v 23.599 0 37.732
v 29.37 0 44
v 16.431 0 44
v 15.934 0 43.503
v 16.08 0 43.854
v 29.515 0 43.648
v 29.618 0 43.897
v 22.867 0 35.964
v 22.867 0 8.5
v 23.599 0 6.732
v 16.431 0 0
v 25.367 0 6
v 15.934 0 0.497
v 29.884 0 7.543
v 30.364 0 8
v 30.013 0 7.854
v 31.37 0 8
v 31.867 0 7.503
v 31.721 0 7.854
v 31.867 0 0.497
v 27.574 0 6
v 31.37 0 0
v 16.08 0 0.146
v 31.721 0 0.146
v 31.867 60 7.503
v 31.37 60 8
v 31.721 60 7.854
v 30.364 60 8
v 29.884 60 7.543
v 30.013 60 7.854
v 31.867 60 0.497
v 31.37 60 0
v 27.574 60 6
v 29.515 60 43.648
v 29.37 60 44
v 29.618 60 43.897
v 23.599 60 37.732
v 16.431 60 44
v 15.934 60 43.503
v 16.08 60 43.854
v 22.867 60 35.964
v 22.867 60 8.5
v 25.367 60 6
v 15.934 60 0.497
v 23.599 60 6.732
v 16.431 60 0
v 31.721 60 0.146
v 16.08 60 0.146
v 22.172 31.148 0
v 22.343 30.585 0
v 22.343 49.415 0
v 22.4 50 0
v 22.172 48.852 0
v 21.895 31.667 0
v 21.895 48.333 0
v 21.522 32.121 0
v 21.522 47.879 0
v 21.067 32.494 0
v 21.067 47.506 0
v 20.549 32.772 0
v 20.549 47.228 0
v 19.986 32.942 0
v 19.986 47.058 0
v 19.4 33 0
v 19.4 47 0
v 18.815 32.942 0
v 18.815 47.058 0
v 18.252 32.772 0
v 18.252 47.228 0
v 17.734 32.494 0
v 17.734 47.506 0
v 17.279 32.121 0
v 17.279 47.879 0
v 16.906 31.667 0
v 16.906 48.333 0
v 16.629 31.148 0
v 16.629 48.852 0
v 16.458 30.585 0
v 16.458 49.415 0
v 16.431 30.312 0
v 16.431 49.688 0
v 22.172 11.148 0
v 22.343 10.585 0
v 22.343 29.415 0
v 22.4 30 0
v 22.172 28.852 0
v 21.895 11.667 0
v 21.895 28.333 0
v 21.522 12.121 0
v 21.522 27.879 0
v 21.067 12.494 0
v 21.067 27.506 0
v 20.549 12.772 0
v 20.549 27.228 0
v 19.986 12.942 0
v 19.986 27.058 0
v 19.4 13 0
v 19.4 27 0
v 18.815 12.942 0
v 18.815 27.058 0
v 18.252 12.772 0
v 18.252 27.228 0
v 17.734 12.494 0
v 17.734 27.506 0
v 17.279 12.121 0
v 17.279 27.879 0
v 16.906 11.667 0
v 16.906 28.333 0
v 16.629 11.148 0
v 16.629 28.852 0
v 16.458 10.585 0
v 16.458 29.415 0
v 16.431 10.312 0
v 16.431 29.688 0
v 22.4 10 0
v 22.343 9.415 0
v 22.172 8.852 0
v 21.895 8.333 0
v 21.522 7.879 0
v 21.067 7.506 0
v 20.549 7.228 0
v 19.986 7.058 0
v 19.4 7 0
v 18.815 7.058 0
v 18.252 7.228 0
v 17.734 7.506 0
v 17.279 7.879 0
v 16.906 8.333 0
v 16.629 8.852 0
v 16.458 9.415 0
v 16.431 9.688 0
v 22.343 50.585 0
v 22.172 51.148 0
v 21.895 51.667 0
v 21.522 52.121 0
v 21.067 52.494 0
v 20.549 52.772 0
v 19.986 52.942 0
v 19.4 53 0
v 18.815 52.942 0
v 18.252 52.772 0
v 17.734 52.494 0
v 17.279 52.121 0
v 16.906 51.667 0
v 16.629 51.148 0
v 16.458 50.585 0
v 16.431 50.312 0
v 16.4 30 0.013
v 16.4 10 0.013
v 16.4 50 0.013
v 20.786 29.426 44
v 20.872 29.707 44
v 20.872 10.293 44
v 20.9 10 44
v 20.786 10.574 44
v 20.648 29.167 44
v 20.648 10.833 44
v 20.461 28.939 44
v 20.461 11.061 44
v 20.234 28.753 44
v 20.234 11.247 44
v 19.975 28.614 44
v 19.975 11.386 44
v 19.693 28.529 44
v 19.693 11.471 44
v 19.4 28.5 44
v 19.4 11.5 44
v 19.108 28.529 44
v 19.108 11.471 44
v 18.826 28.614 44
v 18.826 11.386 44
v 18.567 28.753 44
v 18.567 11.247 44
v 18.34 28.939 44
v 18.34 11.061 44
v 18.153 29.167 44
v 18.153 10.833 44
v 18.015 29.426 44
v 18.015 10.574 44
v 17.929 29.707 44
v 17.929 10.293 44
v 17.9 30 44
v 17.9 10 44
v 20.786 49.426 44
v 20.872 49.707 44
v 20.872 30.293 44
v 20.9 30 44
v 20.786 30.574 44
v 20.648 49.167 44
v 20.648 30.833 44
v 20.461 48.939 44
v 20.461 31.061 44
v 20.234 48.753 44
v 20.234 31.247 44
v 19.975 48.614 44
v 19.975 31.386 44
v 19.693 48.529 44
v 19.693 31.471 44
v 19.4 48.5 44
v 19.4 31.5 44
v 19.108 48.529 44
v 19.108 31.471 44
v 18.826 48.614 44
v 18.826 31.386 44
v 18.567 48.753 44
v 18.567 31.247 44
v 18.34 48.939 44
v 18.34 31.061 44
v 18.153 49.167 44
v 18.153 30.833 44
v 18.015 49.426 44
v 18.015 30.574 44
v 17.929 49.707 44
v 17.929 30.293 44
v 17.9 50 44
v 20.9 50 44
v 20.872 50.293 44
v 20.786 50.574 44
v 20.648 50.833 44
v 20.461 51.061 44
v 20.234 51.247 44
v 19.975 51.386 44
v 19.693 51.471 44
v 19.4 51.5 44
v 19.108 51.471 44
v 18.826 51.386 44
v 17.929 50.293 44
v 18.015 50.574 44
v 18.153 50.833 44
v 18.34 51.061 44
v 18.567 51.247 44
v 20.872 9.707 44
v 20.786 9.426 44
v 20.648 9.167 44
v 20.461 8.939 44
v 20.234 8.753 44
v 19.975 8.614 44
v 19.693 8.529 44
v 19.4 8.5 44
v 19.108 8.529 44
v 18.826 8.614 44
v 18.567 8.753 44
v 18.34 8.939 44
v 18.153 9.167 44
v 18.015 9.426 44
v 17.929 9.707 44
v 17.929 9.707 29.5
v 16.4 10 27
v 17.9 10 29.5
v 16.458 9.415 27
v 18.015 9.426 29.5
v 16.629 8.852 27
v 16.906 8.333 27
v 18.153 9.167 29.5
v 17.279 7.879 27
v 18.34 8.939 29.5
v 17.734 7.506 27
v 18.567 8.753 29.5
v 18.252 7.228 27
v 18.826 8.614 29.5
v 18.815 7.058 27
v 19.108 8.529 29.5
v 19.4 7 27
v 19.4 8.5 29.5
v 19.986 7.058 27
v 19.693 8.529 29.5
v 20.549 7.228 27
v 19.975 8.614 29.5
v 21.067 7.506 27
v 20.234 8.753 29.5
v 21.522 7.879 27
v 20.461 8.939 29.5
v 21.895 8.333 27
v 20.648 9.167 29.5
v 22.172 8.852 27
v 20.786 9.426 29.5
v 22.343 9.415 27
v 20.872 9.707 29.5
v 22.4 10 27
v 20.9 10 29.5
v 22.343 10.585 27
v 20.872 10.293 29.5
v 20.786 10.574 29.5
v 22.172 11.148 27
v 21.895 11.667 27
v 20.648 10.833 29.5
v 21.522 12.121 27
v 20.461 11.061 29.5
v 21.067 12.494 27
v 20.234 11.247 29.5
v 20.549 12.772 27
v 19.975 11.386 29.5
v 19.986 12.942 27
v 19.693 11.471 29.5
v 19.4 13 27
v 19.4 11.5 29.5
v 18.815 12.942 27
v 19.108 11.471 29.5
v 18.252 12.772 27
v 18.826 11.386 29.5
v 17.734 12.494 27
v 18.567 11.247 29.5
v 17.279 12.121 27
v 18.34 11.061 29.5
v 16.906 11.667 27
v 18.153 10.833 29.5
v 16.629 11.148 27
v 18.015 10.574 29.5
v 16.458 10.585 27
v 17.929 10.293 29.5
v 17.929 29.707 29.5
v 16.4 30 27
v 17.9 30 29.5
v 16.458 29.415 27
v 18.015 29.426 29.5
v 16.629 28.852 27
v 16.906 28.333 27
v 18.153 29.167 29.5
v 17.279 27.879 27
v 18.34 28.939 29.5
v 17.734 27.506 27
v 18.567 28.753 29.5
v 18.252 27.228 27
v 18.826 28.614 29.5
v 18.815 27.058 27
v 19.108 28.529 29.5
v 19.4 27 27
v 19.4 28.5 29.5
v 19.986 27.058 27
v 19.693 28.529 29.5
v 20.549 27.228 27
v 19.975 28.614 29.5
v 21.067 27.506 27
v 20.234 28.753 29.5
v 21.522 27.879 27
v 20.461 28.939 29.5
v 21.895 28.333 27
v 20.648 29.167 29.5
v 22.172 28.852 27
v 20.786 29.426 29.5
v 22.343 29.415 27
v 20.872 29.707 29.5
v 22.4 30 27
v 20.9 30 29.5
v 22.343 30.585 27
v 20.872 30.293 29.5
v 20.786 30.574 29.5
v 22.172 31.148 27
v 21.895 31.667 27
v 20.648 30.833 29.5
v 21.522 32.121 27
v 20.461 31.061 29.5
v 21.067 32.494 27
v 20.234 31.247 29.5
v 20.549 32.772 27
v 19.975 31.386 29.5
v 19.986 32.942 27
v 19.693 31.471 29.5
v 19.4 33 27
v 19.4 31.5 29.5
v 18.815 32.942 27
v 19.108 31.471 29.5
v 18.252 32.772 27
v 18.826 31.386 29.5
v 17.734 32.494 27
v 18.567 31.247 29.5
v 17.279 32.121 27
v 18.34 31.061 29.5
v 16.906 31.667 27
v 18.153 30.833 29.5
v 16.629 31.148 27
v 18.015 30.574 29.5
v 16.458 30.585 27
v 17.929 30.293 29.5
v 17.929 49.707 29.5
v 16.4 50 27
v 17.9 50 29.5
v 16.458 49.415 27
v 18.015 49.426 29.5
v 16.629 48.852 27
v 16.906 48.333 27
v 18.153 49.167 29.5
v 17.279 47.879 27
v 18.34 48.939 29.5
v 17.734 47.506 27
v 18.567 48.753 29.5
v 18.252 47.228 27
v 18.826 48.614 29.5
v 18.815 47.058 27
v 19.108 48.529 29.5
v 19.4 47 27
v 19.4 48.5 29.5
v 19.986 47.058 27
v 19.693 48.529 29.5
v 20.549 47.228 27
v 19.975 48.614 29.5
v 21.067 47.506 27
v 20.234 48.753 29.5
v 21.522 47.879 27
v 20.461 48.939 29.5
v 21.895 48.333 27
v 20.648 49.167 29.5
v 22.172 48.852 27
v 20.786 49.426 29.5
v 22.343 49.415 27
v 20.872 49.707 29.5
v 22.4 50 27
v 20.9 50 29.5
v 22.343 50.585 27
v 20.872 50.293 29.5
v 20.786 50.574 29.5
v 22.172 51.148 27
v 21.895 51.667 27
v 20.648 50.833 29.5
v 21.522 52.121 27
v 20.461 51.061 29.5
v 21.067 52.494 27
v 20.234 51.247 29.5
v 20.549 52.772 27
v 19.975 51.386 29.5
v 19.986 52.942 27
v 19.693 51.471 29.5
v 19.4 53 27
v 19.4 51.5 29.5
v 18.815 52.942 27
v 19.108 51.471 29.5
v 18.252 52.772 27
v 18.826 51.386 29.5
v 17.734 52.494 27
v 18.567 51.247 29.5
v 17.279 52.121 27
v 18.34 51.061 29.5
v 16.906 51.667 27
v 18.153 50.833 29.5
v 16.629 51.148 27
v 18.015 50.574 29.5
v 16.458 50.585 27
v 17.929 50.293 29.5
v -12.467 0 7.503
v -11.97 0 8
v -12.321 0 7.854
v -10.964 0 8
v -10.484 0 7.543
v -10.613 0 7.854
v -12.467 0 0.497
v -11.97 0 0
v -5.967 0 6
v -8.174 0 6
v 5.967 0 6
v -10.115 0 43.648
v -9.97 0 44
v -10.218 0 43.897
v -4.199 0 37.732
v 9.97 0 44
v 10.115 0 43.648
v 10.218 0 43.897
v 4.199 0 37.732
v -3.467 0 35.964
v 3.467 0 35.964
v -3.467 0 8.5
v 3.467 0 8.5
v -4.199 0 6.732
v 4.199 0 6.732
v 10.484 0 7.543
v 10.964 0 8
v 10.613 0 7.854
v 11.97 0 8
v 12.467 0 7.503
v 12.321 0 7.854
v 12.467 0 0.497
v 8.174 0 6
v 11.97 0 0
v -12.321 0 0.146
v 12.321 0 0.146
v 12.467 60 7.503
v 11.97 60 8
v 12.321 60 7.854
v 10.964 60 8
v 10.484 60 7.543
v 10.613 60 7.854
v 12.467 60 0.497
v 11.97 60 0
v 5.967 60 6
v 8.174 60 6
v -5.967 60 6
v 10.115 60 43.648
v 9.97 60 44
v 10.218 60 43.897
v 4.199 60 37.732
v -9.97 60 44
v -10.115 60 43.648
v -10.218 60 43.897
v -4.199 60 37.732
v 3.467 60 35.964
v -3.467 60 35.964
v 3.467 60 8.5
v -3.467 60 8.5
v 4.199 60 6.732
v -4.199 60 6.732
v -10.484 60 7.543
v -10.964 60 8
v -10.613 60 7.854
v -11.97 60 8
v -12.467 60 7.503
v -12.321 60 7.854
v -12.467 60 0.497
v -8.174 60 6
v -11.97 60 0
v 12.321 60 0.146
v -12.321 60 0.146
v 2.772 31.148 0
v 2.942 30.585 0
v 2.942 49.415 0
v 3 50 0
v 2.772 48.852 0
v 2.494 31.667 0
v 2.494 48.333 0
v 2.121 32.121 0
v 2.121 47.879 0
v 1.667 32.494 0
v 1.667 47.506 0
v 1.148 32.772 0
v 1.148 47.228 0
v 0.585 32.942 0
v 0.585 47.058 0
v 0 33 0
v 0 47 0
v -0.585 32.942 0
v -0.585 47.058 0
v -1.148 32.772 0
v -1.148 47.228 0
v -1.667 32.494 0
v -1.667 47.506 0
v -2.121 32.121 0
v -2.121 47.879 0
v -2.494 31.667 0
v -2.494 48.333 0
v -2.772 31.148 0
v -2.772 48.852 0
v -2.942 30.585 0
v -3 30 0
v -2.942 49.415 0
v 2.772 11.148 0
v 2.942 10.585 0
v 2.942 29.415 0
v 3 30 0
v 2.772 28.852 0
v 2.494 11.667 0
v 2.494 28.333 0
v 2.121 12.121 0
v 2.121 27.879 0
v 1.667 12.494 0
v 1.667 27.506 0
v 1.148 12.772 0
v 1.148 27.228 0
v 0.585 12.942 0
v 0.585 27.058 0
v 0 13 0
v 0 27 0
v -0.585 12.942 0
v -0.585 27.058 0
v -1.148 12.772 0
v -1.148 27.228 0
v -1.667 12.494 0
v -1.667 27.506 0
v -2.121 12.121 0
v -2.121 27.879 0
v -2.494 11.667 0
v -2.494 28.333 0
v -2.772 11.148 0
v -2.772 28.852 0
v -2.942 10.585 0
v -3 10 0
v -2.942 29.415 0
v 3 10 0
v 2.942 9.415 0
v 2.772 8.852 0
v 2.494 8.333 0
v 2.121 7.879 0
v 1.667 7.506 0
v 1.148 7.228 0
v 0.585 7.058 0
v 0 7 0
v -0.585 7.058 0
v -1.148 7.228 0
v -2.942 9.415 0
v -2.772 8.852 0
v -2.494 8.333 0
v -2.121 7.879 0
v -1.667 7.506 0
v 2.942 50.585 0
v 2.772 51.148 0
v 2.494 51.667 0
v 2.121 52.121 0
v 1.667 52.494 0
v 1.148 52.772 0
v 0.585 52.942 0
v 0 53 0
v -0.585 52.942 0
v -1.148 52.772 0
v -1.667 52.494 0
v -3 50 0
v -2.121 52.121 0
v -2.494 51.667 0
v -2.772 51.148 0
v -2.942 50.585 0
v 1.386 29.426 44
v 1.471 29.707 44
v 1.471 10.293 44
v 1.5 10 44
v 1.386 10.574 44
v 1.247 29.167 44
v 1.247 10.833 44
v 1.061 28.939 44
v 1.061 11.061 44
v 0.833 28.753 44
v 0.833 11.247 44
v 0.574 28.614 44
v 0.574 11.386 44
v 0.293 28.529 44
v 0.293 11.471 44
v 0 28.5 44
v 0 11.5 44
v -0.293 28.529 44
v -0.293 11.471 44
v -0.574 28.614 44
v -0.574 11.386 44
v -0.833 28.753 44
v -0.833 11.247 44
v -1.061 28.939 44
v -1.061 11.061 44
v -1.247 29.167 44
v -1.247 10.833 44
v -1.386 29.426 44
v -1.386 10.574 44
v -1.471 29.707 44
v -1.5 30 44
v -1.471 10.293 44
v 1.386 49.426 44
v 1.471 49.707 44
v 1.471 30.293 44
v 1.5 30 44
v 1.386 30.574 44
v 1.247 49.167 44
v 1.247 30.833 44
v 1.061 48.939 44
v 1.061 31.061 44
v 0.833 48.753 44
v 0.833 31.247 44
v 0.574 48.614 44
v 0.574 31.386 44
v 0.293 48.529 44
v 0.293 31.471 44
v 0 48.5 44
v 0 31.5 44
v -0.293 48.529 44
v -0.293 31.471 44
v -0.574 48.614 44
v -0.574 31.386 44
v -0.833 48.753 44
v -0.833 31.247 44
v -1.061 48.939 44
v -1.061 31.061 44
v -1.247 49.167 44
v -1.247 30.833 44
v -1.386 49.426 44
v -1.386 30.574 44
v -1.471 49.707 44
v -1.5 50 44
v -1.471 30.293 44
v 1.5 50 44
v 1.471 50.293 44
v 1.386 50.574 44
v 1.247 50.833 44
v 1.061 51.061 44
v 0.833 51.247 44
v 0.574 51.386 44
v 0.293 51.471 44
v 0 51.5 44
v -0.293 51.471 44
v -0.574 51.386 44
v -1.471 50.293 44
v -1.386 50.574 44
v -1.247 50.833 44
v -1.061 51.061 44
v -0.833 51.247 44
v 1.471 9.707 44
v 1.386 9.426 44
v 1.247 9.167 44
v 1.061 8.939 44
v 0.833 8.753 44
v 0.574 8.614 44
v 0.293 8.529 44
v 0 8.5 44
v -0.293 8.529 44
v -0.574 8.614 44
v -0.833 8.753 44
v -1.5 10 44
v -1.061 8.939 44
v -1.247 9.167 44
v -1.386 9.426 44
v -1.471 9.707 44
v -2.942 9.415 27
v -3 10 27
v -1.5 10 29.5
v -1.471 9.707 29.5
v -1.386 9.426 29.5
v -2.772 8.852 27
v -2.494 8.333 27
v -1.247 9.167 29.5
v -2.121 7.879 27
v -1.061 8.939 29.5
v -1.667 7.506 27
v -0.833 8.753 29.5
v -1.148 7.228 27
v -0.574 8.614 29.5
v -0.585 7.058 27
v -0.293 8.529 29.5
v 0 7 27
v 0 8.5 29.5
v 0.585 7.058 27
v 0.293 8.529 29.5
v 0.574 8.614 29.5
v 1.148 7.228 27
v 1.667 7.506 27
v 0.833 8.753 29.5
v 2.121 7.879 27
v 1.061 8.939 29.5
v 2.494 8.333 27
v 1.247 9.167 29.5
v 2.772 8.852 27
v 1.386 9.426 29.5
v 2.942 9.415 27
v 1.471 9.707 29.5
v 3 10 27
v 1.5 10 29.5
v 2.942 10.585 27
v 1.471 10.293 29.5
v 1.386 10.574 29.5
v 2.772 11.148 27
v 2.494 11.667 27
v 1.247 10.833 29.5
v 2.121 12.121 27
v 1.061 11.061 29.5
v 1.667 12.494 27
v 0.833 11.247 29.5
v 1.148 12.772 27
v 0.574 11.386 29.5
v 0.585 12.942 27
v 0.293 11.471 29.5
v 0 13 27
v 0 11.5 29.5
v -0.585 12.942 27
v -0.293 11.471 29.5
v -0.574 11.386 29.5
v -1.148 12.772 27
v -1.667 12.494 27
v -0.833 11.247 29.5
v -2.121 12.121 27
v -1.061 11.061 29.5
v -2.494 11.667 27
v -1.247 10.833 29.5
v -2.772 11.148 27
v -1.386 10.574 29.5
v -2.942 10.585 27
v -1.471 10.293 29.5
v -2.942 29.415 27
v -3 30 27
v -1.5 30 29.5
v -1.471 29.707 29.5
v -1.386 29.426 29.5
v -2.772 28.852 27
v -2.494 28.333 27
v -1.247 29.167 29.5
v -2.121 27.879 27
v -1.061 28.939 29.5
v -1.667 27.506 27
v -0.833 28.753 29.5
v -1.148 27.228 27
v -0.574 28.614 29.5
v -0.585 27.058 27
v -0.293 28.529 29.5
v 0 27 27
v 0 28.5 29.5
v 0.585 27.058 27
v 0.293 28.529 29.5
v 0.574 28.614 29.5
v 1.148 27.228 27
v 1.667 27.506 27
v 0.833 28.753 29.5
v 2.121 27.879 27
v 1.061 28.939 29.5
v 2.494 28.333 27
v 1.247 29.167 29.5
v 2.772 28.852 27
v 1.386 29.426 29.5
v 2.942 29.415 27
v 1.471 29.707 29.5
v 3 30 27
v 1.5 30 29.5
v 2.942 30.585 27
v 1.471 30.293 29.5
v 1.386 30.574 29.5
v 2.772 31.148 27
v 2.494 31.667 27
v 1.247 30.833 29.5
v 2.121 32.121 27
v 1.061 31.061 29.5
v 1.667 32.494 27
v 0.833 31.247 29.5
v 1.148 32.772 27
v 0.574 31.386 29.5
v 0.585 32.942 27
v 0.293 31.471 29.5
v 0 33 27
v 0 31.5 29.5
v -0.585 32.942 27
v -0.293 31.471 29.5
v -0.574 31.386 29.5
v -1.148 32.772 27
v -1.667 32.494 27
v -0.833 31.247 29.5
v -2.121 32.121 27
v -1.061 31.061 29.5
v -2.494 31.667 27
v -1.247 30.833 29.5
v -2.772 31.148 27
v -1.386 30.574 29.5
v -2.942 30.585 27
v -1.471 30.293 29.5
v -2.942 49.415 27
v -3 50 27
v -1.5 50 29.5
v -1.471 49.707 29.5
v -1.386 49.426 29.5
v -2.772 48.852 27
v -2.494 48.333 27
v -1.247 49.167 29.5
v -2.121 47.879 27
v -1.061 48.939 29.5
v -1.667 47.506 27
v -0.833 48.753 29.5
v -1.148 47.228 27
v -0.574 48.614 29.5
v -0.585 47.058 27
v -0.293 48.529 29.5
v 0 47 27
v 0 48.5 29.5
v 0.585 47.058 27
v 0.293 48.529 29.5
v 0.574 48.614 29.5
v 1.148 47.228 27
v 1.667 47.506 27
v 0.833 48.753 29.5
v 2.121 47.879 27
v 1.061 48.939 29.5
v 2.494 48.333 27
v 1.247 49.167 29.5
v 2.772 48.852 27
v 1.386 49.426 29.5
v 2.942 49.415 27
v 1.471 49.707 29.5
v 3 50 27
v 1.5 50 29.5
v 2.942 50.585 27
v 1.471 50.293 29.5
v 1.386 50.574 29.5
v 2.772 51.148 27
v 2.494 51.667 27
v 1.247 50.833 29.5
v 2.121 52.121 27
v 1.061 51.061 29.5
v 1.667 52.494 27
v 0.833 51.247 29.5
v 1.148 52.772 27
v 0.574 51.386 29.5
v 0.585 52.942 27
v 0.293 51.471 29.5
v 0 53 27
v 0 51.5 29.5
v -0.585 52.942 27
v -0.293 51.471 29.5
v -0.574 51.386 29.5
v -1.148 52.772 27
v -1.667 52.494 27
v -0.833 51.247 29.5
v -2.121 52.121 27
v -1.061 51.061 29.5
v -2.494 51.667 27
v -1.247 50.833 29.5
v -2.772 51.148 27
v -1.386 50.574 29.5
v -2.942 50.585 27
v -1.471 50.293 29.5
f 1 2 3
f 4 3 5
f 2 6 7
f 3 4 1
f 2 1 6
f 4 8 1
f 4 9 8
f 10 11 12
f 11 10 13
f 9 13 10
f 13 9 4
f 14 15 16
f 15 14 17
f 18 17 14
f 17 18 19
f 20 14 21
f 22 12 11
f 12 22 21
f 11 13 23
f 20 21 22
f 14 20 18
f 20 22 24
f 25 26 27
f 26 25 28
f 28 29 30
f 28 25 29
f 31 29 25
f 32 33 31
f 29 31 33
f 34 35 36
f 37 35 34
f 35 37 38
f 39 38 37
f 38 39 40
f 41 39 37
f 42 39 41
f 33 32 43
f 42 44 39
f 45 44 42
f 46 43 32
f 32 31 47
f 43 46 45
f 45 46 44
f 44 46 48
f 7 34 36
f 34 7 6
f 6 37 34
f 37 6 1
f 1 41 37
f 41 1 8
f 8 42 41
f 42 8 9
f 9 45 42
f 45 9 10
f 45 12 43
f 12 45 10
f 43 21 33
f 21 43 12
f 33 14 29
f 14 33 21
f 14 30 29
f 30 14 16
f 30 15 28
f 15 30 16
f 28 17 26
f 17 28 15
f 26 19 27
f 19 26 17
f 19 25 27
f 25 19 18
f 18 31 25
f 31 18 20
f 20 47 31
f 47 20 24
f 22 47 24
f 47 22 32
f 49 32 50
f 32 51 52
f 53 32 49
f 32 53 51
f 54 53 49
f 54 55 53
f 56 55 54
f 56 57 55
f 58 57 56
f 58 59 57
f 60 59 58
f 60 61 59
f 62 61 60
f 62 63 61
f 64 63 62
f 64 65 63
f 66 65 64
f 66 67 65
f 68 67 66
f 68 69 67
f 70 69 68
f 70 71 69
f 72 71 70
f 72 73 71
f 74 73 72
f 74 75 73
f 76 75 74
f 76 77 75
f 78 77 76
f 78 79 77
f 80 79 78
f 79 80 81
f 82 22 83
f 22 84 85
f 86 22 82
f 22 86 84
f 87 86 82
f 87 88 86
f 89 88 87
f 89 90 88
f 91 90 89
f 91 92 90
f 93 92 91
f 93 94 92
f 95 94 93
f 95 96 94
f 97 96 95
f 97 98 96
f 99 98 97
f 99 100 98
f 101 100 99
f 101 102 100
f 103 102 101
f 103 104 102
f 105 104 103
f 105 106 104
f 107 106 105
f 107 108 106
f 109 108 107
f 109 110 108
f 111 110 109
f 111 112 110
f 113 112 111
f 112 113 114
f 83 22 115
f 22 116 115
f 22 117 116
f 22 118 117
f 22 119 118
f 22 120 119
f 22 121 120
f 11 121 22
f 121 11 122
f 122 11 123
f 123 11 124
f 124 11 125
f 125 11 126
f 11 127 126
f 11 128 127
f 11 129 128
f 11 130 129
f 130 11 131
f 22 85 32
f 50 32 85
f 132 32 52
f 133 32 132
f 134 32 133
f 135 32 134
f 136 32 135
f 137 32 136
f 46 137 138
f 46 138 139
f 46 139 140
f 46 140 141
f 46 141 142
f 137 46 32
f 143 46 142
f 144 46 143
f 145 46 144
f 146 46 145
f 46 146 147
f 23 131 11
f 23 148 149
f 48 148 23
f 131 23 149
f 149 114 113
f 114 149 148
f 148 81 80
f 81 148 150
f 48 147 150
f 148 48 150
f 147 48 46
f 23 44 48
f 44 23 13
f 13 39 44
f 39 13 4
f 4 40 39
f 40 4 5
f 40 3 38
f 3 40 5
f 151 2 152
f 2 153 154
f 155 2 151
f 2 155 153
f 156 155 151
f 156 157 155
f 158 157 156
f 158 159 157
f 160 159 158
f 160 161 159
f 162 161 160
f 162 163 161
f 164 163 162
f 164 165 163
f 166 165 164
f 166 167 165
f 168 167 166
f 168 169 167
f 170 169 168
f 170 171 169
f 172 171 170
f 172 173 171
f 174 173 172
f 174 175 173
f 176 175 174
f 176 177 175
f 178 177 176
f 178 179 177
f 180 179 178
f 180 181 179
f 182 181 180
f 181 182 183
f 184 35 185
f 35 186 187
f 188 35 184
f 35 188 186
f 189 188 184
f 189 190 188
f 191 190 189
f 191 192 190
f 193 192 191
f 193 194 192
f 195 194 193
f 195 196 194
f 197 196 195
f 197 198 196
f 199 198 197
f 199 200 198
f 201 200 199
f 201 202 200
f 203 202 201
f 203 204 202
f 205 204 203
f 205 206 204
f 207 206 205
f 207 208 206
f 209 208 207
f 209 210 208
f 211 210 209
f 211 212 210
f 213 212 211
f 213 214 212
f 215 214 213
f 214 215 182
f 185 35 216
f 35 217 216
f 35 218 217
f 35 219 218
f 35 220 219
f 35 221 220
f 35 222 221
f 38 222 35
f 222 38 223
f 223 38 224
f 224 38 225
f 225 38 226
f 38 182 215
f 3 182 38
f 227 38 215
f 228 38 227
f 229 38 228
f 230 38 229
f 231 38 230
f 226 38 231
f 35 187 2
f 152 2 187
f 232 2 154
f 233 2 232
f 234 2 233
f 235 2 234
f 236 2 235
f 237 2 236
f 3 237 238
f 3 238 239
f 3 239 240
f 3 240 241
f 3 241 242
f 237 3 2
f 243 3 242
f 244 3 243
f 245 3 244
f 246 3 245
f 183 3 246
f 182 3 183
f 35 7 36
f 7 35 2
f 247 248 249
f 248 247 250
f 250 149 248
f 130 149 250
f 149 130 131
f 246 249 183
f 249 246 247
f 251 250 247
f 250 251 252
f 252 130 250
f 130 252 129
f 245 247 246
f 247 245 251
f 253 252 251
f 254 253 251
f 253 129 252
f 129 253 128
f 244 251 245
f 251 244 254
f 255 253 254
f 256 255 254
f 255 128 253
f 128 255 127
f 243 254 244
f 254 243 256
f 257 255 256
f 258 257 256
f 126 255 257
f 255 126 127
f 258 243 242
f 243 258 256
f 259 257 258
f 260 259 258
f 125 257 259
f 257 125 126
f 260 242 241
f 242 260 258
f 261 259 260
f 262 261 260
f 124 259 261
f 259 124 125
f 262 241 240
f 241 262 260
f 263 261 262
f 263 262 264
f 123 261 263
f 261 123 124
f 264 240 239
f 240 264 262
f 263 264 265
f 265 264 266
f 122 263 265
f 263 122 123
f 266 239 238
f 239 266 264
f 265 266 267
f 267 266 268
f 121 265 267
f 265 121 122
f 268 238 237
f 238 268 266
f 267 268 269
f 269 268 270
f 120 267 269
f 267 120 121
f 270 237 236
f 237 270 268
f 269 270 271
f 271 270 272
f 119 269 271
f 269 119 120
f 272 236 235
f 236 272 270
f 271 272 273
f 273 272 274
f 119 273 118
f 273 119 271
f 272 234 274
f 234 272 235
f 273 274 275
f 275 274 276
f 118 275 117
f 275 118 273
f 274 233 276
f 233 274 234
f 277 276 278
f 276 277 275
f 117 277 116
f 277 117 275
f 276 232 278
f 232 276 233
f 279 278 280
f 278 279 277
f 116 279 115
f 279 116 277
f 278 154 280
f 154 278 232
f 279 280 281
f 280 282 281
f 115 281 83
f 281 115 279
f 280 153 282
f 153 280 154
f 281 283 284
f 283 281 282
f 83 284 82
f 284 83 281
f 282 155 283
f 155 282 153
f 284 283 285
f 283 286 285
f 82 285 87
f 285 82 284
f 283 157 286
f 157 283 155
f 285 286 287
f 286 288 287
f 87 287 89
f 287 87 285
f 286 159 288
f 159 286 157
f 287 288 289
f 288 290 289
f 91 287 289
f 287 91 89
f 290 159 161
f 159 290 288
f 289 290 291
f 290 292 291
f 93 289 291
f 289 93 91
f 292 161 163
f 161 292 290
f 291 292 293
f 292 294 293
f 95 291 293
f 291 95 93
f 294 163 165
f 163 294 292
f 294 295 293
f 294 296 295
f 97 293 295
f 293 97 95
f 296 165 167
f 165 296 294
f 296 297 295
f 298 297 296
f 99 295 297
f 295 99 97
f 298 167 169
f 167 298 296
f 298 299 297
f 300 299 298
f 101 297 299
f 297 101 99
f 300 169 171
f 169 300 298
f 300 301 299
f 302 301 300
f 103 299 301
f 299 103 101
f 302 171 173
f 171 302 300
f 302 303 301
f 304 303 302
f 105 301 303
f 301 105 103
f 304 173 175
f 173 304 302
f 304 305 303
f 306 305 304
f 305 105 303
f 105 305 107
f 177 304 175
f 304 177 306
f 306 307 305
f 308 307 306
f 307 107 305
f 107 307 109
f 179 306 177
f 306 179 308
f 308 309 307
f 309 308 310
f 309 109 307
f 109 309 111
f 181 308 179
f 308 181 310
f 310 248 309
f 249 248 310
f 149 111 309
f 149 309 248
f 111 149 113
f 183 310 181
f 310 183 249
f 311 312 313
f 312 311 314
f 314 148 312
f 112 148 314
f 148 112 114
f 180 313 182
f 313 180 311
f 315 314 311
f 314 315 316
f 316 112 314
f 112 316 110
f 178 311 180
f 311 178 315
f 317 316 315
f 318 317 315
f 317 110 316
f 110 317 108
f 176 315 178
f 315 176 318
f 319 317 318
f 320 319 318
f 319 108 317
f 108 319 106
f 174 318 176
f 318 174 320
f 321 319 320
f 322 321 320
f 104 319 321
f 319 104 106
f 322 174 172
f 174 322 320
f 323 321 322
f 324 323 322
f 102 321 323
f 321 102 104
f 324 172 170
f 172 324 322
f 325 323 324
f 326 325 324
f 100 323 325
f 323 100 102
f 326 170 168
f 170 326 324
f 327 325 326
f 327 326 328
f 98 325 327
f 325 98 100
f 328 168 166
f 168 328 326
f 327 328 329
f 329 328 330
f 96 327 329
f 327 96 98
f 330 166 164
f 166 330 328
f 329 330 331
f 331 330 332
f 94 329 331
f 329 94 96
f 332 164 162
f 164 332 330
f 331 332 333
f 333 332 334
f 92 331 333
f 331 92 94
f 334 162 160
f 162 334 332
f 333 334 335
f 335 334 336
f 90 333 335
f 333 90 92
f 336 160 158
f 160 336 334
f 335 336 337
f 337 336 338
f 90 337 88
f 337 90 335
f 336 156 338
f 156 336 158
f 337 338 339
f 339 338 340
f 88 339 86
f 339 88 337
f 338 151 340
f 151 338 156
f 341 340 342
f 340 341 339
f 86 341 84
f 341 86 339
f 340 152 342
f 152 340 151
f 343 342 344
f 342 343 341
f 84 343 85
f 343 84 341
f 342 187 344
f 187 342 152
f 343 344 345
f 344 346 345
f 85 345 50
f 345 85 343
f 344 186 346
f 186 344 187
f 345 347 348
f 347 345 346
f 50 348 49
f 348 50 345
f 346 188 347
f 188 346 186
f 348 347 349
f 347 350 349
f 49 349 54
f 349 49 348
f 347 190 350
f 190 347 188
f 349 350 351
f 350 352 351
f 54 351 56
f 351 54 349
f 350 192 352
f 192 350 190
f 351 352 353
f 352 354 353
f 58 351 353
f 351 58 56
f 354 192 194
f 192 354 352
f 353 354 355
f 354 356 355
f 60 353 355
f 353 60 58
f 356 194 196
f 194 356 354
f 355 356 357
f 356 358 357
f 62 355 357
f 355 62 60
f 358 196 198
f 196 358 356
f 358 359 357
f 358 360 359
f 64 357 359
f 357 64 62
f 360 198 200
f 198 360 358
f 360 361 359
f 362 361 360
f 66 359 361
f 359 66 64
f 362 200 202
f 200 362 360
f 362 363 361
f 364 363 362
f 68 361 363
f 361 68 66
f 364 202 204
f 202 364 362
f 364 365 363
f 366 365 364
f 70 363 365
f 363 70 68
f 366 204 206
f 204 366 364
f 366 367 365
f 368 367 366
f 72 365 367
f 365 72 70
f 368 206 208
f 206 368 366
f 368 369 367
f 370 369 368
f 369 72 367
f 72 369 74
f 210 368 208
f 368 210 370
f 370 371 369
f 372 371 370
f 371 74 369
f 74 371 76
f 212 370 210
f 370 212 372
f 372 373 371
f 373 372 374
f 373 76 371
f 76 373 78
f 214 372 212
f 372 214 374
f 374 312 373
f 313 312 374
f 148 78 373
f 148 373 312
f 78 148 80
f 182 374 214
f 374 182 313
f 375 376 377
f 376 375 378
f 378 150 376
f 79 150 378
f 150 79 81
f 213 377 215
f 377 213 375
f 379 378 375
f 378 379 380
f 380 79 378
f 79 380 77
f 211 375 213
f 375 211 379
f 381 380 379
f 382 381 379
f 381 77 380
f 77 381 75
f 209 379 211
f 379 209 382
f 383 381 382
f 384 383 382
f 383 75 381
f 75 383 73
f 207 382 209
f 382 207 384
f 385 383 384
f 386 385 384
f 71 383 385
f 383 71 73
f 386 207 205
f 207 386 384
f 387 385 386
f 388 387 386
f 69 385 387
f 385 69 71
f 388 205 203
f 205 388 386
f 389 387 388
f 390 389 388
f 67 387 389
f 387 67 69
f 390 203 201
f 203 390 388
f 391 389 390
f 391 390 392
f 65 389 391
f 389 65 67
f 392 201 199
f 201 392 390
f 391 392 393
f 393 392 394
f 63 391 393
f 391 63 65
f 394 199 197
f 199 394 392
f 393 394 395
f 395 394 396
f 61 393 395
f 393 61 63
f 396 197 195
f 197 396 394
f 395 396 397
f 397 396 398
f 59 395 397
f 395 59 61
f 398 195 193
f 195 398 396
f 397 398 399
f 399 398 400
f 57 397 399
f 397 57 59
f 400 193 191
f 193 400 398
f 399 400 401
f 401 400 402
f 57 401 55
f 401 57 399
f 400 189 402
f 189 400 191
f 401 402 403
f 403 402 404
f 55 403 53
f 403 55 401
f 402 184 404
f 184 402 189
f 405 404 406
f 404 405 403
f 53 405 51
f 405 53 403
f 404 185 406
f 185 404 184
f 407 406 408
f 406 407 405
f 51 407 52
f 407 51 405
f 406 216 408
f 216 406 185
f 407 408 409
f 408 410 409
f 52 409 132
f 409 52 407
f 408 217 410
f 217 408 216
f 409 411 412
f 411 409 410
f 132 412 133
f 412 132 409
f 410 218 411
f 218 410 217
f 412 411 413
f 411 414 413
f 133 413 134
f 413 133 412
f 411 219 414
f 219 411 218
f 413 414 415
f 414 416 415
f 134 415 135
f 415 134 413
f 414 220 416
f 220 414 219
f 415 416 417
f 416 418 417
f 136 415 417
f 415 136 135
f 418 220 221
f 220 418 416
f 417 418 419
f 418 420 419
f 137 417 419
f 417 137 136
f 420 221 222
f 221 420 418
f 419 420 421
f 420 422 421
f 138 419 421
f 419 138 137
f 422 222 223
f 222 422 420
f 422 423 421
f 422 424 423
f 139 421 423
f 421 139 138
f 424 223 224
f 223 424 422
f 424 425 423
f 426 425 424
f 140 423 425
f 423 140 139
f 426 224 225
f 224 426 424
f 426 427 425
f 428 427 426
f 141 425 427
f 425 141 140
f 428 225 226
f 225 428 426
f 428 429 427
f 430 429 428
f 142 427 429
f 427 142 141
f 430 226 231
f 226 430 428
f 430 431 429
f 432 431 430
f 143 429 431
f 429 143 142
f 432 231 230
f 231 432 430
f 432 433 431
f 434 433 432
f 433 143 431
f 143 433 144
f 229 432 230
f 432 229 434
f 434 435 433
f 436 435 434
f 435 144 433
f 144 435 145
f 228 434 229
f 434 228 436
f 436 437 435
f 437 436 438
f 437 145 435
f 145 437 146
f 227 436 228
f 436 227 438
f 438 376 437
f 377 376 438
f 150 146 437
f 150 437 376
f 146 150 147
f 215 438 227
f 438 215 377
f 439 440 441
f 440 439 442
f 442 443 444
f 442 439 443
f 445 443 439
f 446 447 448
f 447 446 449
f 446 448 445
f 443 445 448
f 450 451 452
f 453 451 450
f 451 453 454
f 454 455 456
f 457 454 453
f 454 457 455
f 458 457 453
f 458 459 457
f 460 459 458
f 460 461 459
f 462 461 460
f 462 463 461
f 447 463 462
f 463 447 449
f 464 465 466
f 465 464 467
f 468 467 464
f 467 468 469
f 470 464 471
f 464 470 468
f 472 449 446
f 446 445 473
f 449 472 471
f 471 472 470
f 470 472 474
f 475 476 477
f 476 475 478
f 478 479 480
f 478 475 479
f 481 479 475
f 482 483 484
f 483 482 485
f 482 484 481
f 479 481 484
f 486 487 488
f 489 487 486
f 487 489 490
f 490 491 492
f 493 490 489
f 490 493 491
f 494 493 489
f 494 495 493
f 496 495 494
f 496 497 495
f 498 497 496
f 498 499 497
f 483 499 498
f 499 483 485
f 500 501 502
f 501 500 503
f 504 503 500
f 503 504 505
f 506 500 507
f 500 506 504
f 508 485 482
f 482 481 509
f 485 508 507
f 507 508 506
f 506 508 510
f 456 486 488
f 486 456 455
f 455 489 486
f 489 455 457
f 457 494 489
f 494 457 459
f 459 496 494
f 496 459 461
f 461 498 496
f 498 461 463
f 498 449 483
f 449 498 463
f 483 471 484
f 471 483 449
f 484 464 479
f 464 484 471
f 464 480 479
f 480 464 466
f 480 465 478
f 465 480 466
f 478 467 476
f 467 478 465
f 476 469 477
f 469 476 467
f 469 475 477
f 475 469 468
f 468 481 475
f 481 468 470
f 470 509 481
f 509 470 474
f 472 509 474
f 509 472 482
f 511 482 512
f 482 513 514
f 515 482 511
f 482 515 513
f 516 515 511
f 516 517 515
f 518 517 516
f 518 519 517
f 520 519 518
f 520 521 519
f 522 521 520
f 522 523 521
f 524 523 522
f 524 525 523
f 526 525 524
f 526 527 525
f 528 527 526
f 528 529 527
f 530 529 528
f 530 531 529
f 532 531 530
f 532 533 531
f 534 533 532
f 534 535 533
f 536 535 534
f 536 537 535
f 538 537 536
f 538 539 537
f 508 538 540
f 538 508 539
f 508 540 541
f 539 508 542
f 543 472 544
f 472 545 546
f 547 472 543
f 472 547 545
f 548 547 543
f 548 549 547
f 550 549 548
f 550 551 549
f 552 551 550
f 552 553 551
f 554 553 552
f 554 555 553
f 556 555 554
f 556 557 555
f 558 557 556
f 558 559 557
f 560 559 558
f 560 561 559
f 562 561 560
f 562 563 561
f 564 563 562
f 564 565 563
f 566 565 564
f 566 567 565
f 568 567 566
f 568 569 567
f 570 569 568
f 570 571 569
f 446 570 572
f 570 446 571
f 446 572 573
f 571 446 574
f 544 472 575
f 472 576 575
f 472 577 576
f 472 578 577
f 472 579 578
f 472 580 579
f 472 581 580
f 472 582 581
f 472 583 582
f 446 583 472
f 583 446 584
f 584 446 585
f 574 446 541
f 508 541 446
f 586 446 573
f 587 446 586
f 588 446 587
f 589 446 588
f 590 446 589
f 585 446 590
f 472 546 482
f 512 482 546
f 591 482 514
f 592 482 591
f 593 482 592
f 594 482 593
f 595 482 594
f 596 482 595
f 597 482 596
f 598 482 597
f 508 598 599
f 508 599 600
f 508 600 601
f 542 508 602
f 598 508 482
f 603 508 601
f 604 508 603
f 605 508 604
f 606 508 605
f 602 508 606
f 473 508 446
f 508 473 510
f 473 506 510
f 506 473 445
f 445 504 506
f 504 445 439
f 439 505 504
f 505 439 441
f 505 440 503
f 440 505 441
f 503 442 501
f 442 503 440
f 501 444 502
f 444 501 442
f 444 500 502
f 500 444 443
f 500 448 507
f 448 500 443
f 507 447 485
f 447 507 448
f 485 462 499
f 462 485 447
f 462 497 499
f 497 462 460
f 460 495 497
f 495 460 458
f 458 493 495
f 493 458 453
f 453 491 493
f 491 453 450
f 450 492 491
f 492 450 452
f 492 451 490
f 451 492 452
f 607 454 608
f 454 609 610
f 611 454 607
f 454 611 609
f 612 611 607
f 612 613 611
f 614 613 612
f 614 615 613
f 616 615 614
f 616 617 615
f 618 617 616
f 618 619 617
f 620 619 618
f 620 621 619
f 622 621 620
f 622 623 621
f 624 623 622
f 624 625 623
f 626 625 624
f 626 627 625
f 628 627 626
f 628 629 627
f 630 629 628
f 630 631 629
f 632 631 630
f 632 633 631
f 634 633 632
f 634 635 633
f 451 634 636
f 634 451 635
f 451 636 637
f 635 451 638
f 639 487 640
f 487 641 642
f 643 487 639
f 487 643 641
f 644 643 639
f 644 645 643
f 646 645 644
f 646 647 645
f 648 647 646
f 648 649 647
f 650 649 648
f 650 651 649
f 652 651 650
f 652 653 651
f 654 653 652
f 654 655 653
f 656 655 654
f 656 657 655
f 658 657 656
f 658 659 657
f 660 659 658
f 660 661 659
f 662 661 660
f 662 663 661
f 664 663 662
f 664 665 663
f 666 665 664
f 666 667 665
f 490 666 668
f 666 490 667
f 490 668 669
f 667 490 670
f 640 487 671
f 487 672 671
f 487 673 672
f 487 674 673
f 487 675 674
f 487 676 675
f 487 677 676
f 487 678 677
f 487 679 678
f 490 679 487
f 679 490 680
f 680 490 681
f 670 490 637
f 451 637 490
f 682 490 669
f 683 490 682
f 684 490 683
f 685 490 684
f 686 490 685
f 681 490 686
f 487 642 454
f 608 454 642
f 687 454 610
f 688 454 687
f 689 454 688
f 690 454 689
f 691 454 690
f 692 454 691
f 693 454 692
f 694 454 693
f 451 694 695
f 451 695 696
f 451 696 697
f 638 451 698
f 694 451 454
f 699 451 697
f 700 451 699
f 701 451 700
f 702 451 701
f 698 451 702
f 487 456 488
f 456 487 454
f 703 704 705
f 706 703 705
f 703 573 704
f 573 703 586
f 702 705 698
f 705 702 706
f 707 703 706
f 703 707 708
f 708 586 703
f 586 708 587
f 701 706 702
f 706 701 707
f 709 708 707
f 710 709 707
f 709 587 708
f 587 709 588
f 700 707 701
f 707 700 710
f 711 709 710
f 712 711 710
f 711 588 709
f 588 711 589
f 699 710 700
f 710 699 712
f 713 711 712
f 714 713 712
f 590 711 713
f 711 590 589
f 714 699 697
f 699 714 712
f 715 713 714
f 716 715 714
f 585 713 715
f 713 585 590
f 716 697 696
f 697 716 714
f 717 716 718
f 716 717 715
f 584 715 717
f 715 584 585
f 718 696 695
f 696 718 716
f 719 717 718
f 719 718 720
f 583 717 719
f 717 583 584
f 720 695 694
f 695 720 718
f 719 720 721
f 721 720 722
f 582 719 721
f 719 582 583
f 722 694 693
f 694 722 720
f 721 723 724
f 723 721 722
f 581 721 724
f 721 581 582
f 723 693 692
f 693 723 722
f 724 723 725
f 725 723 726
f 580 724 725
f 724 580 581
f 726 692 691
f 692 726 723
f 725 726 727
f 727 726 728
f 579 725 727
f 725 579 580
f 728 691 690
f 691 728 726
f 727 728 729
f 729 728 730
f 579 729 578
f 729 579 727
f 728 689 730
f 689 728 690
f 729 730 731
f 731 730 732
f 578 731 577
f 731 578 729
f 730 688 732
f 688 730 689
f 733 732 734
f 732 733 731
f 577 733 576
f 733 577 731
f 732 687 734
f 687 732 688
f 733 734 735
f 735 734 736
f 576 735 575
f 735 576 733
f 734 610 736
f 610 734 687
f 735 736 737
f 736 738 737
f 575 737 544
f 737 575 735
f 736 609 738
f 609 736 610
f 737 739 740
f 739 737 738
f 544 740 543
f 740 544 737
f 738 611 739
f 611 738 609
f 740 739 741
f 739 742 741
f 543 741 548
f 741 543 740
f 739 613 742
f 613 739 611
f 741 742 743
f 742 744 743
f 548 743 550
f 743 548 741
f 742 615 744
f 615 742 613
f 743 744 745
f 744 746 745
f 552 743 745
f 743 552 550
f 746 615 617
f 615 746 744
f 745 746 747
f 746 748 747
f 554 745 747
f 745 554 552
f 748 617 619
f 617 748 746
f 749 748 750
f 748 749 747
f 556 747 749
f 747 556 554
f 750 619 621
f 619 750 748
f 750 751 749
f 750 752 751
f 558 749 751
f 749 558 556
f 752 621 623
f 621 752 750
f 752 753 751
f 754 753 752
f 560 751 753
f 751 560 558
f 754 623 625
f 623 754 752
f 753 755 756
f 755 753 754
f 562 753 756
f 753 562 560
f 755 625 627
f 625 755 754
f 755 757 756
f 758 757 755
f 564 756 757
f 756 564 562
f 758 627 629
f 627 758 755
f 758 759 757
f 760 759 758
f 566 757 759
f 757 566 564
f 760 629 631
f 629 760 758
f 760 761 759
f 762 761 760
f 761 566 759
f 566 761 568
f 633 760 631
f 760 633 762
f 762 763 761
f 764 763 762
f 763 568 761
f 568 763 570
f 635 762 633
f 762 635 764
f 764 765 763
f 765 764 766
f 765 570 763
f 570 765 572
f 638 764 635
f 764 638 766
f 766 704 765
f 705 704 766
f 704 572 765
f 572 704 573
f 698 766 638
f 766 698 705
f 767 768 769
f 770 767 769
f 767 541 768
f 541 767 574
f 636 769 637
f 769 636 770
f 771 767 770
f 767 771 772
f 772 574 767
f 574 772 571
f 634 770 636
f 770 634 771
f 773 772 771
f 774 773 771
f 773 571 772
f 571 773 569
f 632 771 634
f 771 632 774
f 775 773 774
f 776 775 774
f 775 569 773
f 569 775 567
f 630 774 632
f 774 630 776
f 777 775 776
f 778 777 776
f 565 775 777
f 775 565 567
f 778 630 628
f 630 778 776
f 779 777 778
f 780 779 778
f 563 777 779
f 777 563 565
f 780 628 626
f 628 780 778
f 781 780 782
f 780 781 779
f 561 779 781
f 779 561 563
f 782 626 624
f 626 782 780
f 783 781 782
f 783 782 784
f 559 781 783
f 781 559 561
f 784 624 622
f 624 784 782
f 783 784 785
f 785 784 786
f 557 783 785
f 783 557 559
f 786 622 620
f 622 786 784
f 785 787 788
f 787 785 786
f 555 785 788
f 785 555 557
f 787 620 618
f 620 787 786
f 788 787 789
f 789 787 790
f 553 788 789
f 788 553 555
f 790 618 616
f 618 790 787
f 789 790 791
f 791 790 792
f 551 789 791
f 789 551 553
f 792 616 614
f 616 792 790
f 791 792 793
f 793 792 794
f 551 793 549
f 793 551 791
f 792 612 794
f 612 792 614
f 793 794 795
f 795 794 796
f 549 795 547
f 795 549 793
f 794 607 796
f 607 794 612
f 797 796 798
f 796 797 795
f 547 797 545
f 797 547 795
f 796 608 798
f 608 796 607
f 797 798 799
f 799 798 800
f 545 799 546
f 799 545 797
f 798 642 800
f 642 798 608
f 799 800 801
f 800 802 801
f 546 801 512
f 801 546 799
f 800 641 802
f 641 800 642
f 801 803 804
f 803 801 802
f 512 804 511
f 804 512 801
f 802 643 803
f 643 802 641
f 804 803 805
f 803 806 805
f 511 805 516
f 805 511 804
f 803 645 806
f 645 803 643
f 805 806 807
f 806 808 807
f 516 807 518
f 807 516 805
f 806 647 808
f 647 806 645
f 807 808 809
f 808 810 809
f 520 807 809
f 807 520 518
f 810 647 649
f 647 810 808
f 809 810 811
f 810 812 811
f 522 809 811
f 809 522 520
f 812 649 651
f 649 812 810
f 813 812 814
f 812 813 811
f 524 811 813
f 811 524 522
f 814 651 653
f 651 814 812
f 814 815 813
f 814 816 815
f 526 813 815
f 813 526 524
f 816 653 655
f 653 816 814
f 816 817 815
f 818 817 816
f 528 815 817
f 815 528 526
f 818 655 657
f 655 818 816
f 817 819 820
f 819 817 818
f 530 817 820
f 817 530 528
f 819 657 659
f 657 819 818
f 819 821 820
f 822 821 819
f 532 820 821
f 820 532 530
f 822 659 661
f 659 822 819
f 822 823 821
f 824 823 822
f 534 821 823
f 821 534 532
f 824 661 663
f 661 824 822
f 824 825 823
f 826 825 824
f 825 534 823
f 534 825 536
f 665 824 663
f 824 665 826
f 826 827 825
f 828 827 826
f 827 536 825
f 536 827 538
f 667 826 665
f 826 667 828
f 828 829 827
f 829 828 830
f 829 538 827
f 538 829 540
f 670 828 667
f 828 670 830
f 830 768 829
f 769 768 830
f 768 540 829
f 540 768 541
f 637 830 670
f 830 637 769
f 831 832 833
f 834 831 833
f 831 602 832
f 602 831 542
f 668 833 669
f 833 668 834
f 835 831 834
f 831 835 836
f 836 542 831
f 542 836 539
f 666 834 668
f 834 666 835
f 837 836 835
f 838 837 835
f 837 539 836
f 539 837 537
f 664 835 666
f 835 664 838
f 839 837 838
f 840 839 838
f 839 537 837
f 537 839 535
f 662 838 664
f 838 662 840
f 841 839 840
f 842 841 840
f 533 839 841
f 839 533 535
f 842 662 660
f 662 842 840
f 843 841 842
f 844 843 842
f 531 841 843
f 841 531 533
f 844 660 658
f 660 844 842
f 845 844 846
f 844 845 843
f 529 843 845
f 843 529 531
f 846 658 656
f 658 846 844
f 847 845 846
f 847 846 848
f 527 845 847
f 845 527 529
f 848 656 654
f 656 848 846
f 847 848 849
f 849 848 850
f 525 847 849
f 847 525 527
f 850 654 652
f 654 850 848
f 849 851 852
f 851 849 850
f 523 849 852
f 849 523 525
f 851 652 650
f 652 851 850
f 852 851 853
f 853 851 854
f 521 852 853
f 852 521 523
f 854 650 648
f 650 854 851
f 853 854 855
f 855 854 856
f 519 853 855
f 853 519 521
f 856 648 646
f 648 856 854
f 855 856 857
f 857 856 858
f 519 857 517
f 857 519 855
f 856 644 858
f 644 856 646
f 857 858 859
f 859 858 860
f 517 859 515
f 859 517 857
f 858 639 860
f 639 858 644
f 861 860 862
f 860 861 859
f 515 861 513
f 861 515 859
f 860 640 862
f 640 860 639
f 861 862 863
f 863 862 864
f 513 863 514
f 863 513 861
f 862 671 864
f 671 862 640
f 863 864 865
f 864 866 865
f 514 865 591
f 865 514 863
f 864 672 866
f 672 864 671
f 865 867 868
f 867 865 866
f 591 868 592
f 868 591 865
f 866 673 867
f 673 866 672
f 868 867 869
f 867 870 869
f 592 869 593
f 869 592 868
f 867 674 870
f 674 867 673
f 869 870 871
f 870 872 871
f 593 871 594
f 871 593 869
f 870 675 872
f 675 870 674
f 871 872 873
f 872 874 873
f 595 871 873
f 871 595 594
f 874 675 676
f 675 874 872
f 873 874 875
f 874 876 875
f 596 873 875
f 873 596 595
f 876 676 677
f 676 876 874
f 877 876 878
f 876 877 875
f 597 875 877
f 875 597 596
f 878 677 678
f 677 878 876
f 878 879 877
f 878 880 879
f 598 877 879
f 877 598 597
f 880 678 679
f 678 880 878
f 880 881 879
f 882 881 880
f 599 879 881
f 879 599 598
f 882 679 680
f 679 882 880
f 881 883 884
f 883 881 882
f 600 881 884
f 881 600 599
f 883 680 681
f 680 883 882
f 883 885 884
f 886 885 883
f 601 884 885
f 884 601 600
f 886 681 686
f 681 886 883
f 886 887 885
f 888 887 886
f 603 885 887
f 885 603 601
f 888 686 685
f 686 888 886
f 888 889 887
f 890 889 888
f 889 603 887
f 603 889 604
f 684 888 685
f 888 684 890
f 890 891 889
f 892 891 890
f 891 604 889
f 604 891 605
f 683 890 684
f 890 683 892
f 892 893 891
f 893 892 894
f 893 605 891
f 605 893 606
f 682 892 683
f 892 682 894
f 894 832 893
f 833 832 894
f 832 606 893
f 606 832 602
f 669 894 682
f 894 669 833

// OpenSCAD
MAX_LENGTH_RAW = 550;
TOL = 1.4;
DISTRIBUTOR_W=43;
MAX_LENGTH = MAX_LENGTH_RAW-TOL-DISTRIBUTOR_W;

FIL_W_MAX = 116;
FILL_W_OFFSET = 9;
FIL_W = FIL_W_MAX-2*FILL_W_OFFSET;

FILL_H = 38;
THICKNESS = 6;

LENGTH = 60;

// FIL_COUNT = 4;
SINGLE_COUNT = 4;
PAIR_COUNT = 2;//FIL_COUNT-1;
FIL_COUNT = SINGLE_COUNT/2+PAIR_COUNT;

SCREW_D = 3;
SCREW_L = 30;
SCREW_OFF = 13;
SCREW_D2 = 6;
SCREW_H2 = 2.5;

STABILAZER = 7;
RAD = 2.5;

HOLDER_NIBBLE = 2;


SINGLE_BASE_W = SCREW_D + 0.6555*THICKNESS;

module screw(){
  SCREW_MAX_H = SCREW_L+FILL_H;

  rotate([-90,0,0])
  translate([0,0,-SCREW_OFF])

  rotate_extrude($fn=32)
    polygon(points=[
    [0,0],
    [0,SCREW_MAX_H],
    [SCREW_D2/2,SCREW_MAX_H],
    [SCREW_D2/2,SCREW_L],
    [SCREW_D/2,SCREW_L-SCREW_H2],
    [SCREW_D/2,0]
    ]);
}

// SINGLE_COUNT*SINGLE_BASE_W
// + PAIR_COUNT*PAIR_BASE_W 
// + FIL_COUNT*FIL_W_MAX
// = MAX_LENGTH
// ml = sc*sw + pc*pw + fc*fw
// pc*pw = ml - sc*sw - fc*fw
PAIR_BASE_W = (MAX_LENGTH - SINGLE_COUNT*SINGLE_BASE_W - FIL_COUNT*FIL_W_MAX) / PAIR_COUNT;
echo("------------");
echo("SINGLE_BASE_W: ", str(SINGLE_BASE_W));
echo("------------");
echo("PAIR_BASE_W: ", str(PAIR_BASE_W));
echo("------------");
echo(2*SINGLE_BASE_W+4*FIL_W_MAX+3*PAIR_BASE_W+TOL+DISTRIBUTOR_W)
echo("------------");


// V1:
// ECHO: "SINGLE_BASE_W: ", "11.4"
// ECHO: "------------"
// ECHO: "PAIR_BASE_W: ", "18.4"
/*
 __ __
| || |
| || |
| || |
| || |_____
| ||      |
|/ \______|


      ___ ___
     |  ||  |
     |  ||  |
     |  ||  |
 ____|  ||  |_____
|       ||       |
|______/ \_______|

*/

    // screw();

    translate([0,0,FILL_H+THICKNESS])
rotate([-90,0,0]){
  translate([PAIR_BASE_W+FILL_W_OFFSET,0,0])
  single();
  pair();
}

  // pair();

// pair_outer();

module pair(){
    difference(){
    pair_outer();
    translate([0,0,1/6*LENGTH])
    screw();
    translate([0,0,3/6*LENGTH])
    screw();
    translate([0,0,5/6*LENGTH])
    screw();
  }
}
module pair_outer(){


 points = [
    [0,0],
    [PAIR_BASE_W/2+STABILAZER,0],
    [PAIR_BASE_W/2,STABILAZER],
    [PAIR_BASE_W/2,FILL_H],
    [PAIR_BASE_W/2+FILL_W_OFFSET-HOLDER_NIBBLE,FILL_H],
    [PAIR_BASE_W/2+FILL_W_OFFSET-HOLDER_NIBBLE,FILL_H-HOLDER_NIBBLE],
    [PAIR_BASE_W/2+FILL_W_OFFSET,FILL_H-HOLDER_NIBBLE],
    // [PAIR_BASE_W/2+FILL_W_OFFSET,FILL_H],
    [PAIR_BASE_W/2+FILL_W_OFFSET,FILL_H+THICKNESS],
    [0,FILL_H+THICKNESS]
    ];
  linear_extrude(LENGTH)
  offset(r=-RAD)
  offset(r=RAD)
  union(){
    polygon(points=points);
    mirror([1,0,0])
    polygon(points=points);
  }
}


module single(){
  difference(){
    single_outer();
    translate([SINGLE_BASE_W/2,0,1/6*LENGTH])
    screw();
    translate([SINGLE_BASE_W/2,0,3/6*LENGTH])
    screw();
    translate([SINGLE_BASE_W/2,0,5/6*LENGTH])
    screw();
  }
}
module single_outer(){

  linear_extrude(LENGTH)

  offset(r=-RAD)
  offset(r=RAD)
  polygon(points=[
    [0,0],
    [SINGLE_BASE_W+STABILAZER,0],
    [SINGLE_BASE_W,STABILAZER],
    [SINGLE_BASE_W,FILL_H],
    [SINGLE_BASE_W+FILL_W_OFFSET-HOLDER_NIBBLE,FILL_H],
    [SINGLE_BASE_W+FILL_W_OFFSET-HOLDER_NIBBLE,FILL_H-HOLDER_NIBBLE],
    [SINGLE_BASE_W+FILL_W_OFFSET,FILL_H-HOLDER_NIBBLE],
    [SINGLE_BASE_W+FILL_W_OFFSET,FILL_H+THICKNESS],
    [0,FILL_H+THICKNESS]]);

}
